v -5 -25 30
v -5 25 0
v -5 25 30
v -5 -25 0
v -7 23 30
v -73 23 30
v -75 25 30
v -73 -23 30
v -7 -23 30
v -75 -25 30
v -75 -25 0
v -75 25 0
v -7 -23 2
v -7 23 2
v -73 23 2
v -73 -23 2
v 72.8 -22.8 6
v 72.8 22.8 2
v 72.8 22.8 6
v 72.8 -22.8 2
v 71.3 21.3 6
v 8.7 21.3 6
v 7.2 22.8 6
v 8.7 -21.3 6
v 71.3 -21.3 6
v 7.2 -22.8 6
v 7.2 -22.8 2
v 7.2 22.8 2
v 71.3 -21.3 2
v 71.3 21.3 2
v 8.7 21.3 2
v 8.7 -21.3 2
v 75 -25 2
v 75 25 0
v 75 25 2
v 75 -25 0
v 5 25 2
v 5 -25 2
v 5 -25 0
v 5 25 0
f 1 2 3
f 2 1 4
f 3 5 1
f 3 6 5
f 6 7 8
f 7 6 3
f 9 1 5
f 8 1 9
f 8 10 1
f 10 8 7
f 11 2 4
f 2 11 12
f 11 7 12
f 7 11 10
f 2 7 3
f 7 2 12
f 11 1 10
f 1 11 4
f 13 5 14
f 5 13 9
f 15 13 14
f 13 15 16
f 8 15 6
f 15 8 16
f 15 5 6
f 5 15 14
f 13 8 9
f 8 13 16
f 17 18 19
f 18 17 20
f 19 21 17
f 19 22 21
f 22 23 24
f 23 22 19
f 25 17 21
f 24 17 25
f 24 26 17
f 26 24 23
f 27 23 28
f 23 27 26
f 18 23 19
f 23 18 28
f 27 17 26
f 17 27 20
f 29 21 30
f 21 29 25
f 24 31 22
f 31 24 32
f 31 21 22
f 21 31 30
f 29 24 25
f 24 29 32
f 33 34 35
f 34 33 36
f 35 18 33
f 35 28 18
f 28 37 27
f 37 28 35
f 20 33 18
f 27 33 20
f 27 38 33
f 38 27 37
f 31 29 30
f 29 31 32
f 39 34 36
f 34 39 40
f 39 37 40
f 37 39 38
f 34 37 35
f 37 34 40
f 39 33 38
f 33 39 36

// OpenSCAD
// Two-part enclosure: open-top box + lid (lid printed upside down)
// Both parts side by side on the bed, 10 mm gap, lid on +X side.

$fn = 64;

// ---------- Box ----------
box_x     = 70;    // box outer length (X)
box_y     = 50;    // box outer width (Y)
box_z     = 30;    // box outer height (Z)
wall      = 2;     // box wall thickness
floor_t   = 2;     // box floor thickness

// ---------- Lid ----------
lid_x     = 70;    // lid plate length (X)
lid_y     = 50;    // lid plate width (Y)
lid_t     = 2;     // lid plate thickness
lip_x     = 65.6;  // lip outer length (X) -> 0.2 mm clearance per side
lip_y     = 45.6;  // lip outer width (Y)
lip_wall  = 1.5;   // lip wall thickness
lip_h     = 4;     // lip height above plate

// ---------- Layout ----------
gap       = 10;    // gap between parts on the bed
eps       = 0.5;   // overshoot for clean boolean cuts

// Centre the pair on the origin in X
total_x   = box_x + gap + lid_x;
box_cx    = -total_x/2 + box_x/2;            // box centre X
lid_cx    =  total_x/2 - lid_x/2;            // lid centre X

// ---------- Part 1: box ----------
module box() {
    difference() {
        translate([-box_x/2, -box_y/2, 0])
            cube([box_x, box_y, box_z]);
        // cavity, open at top
        translate([-(box_x - 2*wall)/2, -(box_y - 2*wall)/2, floor_t])
            cube([box_x - 2*wall, box_y - 2*wall, box_z - floor_t + eps]);
    }
}

// ---------- Part 2: lid (upside down) ----------
module lid() {
    union() {
        // plate on the bed
        translate([-lid_x/2, -lid_y/2, 0])
            cube([lid_x, lid_y, lid_t]);
        // rectangular lip on top of the plate
        difference() {
            translate([-lip_x/2, -lip_y/2, lid_t - 0.01])
                cube([lip_x, lip_y, lip_h + 0.01]);
            translate([-(lip_x - 2*lip_wall)/2, -(lip_y - 2*lip_wall)/2, lid_t - eps])
                cube([lip_x - 2*lip_wall, lip_y - 2*lip_wall, lip_h + 2*eps]);
        }
    }
}

translate([box_cx, 0, 0]) box();
translate([lid_cx, 0, 0]) lid();
